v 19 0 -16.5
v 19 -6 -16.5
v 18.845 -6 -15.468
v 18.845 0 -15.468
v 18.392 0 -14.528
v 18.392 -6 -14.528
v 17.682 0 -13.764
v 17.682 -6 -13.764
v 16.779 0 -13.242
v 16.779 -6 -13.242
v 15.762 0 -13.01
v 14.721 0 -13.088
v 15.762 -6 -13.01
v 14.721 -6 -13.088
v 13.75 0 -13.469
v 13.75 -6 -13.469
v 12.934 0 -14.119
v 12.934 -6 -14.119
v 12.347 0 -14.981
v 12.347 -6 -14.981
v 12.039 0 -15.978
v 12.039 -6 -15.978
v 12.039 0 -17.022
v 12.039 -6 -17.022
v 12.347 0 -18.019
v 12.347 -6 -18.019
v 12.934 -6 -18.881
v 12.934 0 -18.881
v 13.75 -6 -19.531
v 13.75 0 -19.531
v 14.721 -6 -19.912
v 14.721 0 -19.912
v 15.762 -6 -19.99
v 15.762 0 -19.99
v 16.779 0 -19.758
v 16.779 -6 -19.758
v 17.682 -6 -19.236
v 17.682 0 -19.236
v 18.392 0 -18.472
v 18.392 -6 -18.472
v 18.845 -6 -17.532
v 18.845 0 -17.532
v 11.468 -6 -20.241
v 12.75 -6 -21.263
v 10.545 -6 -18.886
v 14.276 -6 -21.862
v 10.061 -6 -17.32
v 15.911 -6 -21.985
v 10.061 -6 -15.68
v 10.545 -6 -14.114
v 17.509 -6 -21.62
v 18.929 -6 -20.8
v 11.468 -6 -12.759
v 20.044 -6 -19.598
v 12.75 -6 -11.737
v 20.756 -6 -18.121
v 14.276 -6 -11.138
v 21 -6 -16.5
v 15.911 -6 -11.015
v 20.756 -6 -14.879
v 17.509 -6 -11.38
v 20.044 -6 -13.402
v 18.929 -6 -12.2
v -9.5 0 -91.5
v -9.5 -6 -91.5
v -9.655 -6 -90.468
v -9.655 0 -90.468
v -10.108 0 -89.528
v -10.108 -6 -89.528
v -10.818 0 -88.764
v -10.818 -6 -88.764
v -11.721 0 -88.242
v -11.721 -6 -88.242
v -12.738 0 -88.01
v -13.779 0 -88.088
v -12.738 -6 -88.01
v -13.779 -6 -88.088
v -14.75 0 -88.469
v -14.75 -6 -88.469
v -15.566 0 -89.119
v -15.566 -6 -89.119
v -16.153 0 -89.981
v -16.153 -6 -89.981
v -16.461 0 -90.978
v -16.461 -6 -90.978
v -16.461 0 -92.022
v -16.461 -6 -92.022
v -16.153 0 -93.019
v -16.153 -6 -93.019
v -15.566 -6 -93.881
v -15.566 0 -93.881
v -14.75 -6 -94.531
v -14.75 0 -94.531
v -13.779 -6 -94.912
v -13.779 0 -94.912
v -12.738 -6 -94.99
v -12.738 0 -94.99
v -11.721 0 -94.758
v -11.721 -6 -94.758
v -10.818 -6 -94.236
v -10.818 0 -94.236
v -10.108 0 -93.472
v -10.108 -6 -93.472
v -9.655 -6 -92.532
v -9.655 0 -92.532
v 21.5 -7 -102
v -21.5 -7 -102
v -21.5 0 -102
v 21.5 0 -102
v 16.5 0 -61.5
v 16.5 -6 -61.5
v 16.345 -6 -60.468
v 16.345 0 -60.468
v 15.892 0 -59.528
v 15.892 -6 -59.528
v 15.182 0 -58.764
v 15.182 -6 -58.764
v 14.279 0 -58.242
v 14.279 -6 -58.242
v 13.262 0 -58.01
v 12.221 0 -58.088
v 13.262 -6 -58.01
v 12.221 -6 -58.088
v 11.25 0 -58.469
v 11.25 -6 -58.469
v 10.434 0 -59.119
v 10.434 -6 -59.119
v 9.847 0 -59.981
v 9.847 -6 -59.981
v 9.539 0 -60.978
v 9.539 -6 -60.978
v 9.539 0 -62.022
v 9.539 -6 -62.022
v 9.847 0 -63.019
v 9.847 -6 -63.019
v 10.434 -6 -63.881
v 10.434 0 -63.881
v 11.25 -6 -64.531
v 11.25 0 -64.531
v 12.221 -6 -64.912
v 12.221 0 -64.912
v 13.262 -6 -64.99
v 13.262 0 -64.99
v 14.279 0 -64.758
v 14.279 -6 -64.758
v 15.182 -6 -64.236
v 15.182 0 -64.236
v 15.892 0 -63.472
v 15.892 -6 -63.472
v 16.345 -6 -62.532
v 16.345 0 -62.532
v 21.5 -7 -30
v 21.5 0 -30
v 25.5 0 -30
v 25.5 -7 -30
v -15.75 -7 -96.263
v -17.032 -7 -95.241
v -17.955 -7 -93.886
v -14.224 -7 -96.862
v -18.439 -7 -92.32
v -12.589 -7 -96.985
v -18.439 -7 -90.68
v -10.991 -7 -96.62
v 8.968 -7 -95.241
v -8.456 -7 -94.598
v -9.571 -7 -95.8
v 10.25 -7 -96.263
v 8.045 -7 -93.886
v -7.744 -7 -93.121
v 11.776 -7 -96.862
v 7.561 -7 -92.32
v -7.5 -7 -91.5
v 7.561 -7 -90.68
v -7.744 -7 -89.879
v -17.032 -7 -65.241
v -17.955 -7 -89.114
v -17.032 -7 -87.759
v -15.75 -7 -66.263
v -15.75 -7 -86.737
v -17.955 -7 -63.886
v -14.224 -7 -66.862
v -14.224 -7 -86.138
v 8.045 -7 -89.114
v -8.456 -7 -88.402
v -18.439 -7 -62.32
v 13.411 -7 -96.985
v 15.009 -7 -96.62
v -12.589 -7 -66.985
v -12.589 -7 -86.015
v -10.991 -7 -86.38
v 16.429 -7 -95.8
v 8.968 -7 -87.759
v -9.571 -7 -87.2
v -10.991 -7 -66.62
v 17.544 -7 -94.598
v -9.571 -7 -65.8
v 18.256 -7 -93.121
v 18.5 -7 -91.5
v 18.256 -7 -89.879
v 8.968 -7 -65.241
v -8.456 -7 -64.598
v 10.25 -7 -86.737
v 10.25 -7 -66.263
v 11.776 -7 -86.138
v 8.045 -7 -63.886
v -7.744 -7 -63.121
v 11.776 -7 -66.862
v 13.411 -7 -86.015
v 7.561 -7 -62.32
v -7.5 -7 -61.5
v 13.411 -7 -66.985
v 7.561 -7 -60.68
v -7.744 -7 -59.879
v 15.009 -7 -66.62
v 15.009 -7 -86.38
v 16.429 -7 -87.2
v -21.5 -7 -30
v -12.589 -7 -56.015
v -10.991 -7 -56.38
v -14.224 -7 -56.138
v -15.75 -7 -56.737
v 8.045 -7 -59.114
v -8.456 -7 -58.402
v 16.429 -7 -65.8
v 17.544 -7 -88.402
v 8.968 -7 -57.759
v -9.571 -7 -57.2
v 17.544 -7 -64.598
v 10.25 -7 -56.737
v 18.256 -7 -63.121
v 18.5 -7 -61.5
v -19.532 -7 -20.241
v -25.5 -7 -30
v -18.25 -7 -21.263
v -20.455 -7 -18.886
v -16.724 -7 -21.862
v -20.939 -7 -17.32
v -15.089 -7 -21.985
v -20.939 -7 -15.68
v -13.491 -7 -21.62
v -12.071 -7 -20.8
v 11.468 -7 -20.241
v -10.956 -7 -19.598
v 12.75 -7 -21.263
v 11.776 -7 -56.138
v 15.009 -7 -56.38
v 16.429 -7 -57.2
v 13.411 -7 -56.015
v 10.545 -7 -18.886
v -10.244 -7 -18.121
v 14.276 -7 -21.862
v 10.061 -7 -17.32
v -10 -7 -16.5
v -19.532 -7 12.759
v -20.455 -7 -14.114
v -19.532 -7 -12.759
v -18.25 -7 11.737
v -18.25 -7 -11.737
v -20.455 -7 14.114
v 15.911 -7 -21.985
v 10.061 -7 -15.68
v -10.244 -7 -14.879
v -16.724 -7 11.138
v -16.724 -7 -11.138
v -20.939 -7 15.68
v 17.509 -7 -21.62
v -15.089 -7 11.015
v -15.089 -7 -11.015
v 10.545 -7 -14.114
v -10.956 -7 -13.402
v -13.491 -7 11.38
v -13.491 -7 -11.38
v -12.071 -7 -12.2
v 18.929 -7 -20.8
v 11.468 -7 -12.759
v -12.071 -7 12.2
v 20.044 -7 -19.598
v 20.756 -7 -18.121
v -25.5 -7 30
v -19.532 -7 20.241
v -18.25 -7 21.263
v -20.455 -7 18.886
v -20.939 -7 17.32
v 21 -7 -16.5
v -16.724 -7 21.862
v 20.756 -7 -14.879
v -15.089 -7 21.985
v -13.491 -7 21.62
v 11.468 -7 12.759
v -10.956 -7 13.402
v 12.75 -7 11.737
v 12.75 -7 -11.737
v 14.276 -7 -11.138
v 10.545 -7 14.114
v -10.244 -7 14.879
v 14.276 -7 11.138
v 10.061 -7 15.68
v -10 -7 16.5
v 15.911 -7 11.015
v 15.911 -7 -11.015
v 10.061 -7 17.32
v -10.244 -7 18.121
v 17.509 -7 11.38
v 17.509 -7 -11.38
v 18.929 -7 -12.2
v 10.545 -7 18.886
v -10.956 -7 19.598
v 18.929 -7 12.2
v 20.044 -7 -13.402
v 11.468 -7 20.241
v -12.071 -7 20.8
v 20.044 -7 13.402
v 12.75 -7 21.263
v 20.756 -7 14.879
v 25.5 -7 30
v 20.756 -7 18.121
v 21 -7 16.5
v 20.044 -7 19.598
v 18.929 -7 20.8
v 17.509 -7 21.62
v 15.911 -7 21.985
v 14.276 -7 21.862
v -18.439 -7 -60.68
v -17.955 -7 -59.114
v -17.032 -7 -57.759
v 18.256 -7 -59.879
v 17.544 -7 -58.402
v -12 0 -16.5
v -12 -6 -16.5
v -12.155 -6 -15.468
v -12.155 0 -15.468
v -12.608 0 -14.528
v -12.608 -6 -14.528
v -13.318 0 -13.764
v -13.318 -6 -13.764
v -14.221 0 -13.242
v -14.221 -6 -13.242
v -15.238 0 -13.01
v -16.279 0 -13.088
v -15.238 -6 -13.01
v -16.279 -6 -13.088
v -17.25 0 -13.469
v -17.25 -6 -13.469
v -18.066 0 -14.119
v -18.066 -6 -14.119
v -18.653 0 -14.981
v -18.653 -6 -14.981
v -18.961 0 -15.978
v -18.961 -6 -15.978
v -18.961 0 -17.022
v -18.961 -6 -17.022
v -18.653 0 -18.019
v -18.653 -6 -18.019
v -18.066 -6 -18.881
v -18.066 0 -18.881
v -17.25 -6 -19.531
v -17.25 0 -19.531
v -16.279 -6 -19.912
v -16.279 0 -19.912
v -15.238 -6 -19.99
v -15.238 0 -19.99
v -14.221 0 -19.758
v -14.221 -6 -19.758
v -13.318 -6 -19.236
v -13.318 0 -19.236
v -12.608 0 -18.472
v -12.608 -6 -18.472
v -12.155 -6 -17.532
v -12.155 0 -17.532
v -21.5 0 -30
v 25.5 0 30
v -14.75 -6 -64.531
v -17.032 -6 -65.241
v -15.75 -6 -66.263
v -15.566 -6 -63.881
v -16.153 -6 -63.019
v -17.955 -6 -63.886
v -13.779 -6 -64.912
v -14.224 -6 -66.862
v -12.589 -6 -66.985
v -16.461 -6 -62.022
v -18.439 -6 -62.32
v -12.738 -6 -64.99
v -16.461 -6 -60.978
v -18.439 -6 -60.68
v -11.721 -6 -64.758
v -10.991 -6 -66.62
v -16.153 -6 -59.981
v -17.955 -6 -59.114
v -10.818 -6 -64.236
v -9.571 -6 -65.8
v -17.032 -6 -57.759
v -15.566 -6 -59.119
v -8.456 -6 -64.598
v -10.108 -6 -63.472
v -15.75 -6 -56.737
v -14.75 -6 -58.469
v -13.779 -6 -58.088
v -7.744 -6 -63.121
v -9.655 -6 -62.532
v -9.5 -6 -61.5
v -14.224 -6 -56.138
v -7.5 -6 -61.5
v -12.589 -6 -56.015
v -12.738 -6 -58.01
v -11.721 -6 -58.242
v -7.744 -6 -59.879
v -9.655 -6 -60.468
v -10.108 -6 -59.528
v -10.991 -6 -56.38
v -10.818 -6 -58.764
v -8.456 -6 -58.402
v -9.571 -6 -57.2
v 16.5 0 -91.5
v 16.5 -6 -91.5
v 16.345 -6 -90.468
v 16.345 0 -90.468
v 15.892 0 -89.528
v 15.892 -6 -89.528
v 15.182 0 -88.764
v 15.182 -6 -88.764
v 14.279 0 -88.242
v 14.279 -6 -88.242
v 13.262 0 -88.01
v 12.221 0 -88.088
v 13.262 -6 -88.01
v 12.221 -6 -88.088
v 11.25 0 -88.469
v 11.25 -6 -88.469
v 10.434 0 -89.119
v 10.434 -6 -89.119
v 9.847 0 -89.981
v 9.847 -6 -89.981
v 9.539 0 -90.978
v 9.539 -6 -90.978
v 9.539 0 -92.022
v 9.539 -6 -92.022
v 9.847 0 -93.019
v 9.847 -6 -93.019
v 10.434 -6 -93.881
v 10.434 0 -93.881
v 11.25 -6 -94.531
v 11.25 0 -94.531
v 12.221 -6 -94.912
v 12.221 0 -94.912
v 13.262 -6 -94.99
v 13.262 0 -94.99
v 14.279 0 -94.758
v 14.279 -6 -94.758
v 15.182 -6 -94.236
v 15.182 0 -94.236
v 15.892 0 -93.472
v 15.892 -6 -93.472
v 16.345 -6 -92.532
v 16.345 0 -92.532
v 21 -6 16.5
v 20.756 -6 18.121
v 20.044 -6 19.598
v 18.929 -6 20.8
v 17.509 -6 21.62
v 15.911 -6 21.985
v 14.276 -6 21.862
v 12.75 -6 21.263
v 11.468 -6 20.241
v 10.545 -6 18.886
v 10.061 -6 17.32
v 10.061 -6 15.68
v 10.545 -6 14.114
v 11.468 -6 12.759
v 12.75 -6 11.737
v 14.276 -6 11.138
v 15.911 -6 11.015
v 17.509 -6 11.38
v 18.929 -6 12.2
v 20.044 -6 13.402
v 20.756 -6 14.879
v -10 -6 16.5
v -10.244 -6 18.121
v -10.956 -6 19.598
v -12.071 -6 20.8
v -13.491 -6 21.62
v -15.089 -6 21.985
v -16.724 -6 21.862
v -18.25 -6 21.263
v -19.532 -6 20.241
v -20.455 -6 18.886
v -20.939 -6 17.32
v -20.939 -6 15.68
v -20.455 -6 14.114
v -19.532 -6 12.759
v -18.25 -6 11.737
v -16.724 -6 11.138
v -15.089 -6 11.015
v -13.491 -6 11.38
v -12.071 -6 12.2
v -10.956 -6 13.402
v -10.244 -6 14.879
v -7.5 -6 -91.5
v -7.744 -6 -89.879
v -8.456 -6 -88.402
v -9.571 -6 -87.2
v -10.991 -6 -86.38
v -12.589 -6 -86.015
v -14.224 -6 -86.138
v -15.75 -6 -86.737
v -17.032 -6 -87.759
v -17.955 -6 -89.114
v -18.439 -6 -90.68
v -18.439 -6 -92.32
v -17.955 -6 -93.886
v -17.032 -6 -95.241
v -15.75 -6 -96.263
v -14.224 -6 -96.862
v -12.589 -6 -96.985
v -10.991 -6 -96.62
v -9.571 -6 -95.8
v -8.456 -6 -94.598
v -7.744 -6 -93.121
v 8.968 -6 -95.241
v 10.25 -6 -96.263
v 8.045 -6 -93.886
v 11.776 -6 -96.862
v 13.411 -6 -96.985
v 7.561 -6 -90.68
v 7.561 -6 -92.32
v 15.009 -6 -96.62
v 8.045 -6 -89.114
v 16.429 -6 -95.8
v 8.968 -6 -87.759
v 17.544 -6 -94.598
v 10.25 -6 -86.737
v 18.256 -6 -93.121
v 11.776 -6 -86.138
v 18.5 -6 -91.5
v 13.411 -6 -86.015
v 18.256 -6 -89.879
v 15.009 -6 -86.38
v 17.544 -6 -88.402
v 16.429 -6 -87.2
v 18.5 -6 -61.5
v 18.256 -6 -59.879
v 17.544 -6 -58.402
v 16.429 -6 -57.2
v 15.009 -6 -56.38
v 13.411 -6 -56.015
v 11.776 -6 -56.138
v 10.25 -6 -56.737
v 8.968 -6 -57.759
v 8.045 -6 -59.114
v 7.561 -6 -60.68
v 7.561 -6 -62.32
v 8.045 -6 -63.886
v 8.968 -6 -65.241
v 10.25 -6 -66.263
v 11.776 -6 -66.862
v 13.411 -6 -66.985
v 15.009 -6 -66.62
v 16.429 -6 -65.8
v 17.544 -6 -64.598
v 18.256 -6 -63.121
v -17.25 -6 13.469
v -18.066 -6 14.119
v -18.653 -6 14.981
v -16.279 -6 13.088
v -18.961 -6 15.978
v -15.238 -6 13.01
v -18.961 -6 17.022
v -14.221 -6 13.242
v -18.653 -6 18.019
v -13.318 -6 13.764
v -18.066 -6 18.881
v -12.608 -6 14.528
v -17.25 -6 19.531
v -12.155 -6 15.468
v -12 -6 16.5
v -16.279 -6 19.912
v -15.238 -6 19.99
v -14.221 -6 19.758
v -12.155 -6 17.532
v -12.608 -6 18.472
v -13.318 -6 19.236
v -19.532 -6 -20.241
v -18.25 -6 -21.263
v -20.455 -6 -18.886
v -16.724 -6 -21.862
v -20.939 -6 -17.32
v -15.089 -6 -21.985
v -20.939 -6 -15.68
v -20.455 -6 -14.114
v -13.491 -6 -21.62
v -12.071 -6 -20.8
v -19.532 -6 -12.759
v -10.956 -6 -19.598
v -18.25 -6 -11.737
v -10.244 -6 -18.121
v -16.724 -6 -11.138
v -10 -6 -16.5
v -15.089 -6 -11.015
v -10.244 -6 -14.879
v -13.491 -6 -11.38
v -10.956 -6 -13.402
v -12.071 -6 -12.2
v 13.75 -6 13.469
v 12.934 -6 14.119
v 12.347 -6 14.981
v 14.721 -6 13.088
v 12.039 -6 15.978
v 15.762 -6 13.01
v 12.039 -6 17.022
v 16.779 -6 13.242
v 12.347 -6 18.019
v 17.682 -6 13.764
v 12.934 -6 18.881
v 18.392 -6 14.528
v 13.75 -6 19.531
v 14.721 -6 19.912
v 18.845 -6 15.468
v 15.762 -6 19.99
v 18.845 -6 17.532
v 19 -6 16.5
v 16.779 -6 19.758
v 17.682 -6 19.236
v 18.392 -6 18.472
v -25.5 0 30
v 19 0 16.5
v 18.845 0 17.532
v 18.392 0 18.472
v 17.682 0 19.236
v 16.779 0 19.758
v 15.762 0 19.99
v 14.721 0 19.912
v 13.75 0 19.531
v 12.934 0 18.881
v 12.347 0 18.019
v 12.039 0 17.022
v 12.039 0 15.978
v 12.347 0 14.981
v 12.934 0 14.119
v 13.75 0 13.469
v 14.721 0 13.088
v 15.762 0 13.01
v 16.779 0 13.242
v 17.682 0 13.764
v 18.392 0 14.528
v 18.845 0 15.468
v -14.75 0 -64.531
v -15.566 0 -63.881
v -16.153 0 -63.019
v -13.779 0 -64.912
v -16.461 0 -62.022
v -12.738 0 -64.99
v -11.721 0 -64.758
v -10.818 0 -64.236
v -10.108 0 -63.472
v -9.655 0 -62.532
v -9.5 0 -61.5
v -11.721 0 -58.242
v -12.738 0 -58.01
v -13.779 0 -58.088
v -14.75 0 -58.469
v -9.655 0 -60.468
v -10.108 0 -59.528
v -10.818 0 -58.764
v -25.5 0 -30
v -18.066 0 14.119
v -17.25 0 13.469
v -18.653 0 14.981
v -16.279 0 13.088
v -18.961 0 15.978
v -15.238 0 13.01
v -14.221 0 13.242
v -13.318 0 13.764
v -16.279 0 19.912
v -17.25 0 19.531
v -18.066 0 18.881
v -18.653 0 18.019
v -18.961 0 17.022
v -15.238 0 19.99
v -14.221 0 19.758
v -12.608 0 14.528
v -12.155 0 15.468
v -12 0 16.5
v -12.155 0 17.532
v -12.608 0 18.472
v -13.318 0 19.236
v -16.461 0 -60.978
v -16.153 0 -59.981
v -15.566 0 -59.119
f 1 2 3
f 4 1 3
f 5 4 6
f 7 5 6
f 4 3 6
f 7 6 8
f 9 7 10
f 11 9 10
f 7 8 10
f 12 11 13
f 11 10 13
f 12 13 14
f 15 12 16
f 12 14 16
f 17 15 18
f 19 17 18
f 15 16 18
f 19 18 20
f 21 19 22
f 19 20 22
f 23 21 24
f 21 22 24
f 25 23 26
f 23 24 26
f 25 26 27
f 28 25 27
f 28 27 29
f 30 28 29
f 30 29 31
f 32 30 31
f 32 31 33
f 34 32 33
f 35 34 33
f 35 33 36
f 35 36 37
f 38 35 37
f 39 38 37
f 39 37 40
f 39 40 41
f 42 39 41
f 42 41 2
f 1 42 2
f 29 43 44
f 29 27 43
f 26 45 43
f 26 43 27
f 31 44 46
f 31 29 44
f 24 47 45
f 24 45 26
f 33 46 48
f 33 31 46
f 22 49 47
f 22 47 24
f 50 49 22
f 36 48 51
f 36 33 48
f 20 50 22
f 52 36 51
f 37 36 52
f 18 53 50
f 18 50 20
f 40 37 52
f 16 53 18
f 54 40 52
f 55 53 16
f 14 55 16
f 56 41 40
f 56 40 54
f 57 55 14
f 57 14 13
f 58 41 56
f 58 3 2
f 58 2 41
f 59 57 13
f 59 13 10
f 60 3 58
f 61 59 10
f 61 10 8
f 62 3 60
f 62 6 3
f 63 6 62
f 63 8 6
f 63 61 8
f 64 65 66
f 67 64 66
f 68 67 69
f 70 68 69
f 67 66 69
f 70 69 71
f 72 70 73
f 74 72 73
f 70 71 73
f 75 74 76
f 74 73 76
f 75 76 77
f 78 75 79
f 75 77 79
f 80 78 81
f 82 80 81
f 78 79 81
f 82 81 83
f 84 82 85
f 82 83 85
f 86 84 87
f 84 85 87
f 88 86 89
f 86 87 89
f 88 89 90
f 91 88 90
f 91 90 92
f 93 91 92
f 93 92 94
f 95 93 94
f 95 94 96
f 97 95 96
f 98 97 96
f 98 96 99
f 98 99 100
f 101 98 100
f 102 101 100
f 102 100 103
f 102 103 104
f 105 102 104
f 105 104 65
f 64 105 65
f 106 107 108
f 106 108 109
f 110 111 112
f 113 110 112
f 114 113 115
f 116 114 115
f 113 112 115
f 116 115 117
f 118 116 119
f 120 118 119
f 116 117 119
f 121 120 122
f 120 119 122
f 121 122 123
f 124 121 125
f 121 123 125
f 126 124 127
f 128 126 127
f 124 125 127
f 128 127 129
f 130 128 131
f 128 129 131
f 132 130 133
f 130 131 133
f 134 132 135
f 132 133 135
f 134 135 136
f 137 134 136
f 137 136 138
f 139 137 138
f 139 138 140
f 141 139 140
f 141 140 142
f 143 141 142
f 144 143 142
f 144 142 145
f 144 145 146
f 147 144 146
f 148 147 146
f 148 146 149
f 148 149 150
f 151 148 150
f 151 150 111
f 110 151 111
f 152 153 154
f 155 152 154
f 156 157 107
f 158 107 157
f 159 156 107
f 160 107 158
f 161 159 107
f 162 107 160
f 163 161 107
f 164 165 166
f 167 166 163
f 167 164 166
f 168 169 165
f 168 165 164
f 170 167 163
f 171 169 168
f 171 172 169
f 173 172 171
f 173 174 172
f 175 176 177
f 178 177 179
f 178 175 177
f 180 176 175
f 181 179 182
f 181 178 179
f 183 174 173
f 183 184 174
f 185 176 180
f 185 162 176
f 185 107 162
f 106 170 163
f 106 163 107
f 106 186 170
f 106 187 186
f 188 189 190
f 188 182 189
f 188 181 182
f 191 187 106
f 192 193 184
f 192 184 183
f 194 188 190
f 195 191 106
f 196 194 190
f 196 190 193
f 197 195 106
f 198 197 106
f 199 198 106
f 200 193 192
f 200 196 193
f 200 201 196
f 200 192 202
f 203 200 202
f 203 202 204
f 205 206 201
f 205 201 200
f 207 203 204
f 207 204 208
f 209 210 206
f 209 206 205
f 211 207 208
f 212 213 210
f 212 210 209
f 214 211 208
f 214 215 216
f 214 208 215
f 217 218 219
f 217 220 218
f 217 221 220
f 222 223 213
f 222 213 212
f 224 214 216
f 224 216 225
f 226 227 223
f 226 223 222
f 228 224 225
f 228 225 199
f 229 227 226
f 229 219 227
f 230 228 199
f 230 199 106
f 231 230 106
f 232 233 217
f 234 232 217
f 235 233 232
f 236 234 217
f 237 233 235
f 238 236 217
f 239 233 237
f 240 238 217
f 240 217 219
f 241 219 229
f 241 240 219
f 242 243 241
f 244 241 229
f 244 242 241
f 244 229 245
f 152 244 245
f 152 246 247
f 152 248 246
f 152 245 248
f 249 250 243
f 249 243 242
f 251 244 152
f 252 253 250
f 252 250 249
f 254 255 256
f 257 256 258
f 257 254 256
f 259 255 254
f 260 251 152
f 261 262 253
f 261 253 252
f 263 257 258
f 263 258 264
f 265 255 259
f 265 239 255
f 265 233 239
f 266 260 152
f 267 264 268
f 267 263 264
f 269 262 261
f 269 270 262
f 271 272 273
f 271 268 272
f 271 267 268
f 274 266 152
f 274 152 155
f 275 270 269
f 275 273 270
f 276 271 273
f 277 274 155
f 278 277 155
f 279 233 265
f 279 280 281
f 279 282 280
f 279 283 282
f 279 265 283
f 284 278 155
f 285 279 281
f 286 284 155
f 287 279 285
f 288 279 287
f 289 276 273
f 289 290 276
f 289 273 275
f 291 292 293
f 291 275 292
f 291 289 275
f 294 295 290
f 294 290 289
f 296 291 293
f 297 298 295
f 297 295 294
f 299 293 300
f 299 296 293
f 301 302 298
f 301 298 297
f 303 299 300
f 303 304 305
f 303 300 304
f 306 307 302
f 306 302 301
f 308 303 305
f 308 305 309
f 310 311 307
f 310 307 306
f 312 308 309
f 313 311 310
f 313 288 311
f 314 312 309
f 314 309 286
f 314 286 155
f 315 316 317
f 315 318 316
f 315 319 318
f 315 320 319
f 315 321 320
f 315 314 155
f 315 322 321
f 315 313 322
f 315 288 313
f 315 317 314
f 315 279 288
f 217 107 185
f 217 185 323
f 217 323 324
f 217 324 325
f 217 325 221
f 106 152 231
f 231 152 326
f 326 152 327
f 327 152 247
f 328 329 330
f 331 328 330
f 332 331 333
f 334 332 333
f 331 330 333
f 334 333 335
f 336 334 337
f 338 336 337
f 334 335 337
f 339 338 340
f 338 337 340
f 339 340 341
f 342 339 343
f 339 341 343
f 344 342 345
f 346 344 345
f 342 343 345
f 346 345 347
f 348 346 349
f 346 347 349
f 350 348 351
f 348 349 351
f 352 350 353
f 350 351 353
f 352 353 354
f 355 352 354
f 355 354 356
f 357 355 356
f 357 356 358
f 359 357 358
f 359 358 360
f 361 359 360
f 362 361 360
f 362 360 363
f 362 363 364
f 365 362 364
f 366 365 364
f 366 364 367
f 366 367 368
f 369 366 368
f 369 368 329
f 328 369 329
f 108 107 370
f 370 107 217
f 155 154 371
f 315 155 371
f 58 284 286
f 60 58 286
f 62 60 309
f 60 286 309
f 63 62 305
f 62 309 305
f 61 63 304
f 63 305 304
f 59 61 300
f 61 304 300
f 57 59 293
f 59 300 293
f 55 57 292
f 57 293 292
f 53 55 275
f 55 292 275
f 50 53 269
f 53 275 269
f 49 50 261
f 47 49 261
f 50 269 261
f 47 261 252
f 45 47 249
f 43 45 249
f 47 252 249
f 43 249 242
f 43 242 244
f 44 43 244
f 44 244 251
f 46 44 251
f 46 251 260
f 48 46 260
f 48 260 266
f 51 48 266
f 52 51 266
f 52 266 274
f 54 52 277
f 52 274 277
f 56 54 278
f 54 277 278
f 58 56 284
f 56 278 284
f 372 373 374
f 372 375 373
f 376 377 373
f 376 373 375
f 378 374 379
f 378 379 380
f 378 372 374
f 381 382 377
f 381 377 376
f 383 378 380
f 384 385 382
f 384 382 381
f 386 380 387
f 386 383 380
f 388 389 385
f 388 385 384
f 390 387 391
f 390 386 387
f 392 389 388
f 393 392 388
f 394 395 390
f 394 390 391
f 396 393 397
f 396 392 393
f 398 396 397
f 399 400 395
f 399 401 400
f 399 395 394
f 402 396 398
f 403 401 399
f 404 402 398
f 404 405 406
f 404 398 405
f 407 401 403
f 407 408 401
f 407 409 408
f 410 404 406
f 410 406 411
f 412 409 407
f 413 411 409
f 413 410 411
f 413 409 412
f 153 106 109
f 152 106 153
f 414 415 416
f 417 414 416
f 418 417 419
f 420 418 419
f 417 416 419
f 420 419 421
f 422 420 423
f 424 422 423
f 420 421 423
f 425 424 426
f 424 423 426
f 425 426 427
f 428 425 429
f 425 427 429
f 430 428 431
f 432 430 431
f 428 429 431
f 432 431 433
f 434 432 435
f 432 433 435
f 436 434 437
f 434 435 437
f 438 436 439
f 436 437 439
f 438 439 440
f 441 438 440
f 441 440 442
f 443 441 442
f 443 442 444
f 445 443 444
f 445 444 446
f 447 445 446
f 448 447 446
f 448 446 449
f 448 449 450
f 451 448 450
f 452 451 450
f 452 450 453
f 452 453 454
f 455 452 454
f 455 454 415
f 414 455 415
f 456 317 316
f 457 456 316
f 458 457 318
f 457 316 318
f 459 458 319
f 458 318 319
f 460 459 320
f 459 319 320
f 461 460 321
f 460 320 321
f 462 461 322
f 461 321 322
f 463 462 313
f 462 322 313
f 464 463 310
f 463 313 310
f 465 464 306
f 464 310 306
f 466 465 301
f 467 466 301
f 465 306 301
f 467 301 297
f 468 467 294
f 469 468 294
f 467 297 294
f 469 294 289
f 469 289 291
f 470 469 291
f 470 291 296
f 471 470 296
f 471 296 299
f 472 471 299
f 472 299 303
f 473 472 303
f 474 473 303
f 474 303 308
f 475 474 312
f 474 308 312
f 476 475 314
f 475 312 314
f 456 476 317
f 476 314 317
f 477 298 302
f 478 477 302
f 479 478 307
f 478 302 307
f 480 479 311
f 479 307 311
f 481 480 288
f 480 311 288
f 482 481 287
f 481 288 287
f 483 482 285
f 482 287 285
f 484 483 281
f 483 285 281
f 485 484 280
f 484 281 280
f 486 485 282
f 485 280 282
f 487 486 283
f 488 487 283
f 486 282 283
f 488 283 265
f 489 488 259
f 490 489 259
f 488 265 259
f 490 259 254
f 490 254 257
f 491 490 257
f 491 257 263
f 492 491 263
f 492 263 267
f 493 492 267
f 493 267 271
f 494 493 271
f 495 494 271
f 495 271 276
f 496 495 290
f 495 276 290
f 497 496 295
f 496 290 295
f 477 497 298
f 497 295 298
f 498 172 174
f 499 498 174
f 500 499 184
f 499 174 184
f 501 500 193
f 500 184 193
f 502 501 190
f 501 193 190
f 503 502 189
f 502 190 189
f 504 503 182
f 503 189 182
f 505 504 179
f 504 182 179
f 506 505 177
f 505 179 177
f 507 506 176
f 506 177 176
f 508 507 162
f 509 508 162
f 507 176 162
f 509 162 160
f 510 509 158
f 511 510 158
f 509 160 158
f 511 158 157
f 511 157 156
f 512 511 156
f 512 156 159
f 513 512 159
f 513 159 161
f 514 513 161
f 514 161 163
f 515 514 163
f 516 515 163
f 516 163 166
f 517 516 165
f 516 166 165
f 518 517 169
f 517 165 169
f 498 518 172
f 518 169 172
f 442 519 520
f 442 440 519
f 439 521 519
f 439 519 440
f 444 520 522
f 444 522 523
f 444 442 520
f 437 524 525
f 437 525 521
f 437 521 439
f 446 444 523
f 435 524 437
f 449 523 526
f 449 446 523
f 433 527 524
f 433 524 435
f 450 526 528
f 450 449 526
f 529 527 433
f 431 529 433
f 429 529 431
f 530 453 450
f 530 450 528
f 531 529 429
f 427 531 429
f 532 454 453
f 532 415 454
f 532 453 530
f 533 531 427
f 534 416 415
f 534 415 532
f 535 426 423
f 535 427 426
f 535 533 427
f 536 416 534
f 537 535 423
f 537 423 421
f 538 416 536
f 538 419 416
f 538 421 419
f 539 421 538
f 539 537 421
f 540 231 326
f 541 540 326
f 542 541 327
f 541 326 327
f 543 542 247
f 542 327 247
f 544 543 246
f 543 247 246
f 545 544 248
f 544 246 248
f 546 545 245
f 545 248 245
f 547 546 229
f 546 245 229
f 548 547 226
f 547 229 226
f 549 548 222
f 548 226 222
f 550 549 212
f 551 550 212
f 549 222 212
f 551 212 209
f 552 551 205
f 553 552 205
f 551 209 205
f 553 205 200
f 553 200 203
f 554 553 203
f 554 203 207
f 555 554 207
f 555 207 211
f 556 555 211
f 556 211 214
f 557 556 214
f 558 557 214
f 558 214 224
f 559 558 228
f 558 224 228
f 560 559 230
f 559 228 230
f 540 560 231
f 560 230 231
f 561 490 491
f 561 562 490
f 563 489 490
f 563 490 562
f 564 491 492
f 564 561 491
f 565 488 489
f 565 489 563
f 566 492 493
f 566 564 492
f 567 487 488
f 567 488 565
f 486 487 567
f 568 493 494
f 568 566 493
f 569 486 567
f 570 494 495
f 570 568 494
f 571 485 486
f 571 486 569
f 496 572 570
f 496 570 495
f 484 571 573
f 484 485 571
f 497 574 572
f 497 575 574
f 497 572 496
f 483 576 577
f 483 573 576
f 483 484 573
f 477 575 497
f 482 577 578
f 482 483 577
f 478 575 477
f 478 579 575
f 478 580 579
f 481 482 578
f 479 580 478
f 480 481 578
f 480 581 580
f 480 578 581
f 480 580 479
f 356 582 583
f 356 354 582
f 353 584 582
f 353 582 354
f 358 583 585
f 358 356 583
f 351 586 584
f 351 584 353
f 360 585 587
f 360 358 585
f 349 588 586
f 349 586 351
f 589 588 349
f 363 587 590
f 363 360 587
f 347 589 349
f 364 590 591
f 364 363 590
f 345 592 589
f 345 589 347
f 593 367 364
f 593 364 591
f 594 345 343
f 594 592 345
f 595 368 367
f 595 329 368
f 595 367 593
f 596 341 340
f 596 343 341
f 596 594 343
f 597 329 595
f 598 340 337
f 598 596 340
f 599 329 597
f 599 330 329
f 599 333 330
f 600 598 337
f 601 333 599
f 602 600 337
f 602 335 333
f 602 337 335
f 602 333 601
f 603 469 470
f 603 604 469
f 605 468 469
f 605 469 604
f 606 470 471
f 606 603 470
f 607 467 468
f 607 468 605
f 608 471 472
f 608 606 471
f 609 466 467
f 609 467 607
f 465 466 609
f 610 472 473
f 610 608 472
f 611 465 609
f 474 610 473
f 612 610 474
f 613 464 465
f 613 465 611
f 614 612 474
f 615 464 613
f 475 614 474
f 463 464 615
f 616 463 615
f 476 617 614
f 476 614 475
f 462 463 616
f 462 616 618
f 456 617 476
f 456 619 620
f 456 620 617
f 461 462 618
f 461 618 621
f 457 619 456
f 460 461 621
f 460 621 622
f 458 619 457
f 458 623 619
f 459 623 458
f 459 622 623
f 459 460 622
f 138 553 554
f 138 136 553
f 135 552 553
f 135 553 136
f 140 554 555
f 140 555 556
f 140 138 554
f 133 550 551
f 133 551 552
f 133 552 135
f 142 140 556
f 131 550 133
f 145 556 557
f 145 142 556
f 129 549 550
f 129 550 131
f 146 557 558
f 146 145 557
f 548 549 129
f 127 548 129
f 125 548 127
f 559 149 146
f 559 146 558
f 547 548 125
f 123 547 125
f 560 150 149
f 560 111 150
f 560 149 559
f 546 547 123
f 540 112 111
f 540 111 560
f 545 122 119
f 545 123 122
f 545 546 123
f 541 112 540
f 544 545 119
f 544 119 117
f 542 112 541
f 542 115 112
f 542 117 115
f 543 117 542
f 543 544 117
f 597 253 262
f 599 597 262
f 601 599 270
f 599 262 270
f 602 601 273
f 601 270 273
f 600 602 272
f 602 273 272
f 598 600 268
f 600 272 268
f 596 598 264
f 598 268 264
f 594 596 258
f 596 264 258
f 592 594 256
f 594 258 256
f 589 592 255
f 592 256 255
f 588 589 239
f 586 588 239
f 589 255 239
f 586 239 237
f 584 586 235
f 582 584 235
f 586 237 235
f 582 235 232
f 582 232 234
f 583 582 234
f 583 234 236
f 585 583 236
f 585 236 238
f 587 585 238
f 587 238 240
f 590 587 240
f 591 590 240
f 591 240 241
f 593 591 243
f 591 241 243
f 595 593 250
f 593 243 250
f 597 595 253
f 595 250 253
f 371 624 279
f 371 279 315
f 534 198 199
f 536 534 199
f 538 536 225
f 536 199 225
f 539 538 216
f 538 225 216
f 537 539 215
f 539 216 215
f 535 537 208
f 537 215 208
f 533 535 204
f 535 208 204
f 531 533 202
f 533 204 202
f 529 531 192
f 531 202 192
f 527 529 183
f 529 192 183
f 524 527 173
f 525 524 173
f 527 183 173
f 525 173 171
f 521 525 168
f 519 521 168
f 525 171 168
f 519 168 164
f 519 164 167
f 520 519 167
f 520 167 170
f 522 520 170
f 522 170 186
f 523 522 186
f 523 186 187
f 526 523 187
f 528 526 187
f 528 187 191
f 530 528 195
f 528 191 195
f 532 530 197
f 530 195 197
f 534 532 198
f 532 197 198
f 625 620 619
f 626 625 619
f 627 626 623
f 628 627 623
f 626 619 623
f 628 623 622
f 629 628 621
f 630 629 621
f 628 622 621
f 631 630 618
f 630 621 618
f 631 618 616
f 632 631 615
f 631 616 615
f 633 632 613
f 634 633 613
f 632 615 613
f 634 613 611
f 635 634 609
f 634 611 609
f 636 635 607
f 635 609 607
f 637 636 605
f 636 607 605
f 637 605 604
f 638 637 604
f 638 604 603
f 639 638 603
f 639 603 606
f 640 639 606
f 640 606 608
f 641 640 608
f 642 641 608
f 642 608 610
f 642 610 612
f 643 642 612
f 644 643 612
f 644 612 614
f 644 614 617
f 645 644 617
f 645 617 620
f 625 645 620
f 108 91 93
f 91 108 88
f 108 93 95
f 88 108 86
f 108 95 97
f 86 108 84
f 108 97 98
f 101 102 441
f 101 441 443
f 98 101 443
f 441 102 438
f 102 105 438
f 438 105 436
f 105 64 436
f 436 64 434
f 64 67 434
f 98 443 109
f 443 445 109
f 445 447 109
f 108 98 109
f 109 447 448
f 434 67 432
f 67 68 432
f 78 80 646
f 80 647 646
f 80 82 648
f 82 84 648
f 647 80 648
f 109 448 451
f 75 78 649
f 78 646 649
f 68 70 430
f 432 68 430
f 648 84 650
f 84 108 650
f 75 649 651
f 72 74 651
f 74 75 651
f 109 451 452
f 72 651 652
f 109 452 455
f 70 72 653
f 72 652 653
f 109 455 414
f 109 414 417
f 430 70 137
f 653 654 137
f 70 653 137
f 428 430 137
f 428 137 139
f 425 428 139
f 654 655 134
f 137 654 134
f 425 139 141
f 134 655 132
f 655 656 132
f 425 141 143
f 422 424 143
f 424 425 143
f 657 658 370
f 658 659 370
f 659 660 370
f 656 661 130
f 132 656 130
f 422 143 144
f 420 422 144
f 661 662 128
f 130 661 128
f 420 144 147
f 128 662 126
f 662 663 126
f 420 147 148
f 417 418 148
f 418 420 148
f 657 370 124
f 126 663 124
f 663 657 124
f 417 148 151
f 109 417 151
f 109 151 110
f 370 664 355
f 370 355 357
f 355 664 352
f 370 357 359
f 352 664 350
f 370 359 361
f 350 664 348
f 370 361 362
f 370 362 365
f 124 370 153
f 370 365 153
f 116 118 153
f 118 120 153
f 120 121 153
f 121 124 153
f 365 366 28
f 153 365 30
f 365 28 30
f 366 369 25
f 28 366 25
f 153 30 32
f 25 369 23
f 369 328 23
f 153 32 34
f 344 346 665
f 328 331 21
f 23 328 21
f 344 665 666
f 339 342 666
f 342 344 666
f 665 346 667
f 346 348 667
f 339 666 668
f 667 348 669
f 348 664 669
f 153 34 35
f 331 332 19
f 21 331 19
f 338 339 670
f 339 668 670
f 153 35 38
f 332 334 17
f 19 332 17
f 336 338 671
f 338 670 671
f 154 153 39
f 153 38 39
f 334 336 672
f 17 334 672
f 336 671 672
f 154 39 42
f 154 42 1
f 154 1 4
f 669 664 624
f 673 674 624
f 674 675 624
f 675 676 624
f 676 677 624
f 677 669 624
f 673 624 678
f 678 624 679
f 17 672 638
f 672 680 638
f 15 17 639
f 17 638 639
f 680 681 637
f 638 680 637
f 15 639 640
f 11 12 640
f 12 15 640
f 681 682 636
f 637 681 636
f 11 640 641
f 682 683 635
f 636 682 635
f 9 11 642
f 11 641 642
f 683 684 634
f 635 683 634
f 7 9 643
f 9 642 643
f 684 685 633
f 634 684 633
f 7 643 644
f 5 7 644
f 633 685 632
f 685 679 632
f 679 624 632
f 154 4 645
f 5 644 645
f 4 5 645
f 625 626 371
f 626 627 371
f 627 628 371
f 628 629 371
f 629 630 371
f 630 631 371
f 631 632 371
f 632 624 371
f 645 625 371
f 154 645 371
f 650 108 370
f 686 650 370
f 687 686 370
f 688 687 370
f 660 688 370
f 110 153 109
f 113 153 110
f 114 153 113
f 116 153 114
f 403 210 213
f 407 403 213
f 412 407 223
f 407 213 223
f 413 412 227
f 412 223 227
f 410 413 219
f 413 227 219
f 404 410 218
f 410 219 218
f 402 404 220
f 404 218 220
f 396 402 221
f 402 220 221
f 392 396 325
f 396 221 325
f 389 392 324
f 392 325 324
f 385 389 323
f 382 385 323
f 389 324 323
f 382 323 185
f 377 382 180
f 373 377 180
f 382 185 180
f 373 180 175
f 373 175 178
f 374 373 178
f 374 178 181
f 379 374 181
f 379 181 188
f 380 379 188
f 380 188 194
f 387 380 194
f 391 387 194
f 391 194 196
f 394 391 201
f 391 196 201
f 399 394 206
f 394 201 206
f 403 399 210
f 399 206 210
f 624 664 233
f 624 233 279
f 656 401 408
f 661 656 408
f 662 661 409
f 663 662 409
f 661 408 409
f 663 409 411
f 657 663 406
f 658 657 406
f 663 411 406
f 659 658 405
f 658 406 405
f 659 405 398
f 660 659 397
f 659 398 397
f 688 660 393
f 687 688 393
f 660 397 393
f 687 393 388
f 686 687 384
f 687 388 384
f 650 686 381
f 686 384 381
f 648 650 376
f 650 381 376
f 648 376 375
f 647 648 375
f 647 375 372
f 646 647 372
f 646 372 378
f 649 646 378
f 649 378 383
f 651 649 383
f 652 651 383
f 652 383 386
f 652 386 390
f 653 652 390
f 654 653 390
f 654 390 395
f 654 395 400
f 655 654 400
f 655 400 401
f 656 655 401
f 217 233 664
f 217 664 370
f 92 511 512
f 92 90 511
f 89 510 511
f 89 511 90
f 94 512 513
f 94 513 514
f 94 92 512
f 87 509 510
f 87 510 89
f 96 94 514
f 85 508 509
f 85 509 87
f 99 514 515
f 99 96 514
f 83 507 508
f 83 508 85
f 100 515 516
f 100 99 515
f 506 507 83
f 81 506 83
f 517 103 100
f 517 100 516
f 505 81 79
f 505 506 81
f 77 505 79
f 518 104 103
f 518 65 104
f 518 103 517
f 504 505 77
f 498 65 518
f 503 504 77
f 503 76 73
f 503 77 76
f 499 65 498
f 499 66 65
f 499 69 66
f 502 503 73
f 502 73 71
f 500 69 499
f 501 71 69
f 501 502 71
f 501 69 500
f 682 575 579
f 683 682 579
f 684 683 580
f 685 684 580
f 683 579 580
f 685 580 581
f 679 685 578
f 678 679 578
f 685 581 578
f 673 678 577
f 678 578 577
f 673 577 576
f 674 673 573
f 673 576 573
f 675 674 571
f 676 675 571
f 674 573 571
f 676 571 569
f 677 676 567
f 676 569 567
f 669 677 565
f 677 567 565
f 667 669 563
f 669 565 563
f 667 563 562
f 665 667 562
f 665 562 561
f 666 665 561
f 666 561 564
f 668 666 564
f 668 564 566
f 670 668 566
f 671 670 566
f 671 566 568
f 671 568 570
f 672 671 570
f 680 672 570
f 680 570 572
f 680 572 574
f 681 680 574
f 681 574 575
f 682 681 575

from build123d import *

# Parameters (mm, degrees)
F0_W      = 51
F0_H      = 60
F1_DEPTH  = 7
F2_R      = 3.5
F3_DEPTH  = 25
F4_R      = 5.5
F5_DEPTH  = 1
F6_W      = 43
F6_H      = 80
F7_DEPTH  = 7
F9_R      = 3.5
F10_DEPTH = 25
F11_R     = 5.5
F12_DEPTH = 1
F13_W     = 43
F13_H     = 8
F14_DEPTH = 25


with BuildPart() as f1:
    # F0 (on Front) → F1 (new body)
    with BuildSketch(Plane.XZ):
        Rectangle(F0_W, F0_H)
    extrude(amount=F1_DEPTH)

    # F2 (on face) → F3 (cut)
    with BuildSketch(Plane.XZ.offset(7)):
        with Locations((-15.5, 16.5)):
            Circle(F2_R)
        with Locations((-15.5, -16.5)):
            Circle(F2_R)
        with Locations((15.5, 16.5)):
            Circle(F2_R)
        with Locations((15.5, -16.5)):
            Circle(F2_R)
    extrude(amount=-F3_DEPTH, mode=Mode.SUBTRACT)

    # F4 (on face) → F5 (cut)
    with BuildSketch(Plane.XZ.offset(7)):
        with Locations((-15.5, 16.5)):
            Circle(F4_R)
        with Locations((-15.5, -16.5)):
            Circle(F4_R)
        with Locations((15.5, -16.5)):
            Circle(F4_R)
        with Locations((15.5, 16.5)):
            Circle(F4_R)
    extrude(amount=-F5_DEPTH, mode=Mode.SUBTRACT)


with BuildPart() as f7:
    # F6 (on face) → F7 (new body)
    with BuildSketch(Plane.XZ.offset(7)):
        with Locations((0, -70)):
            Rectangle(F6_W, F6_H)
    extrude(amount=-F7_DEPTH)


with BuildPart() as f1_1:
    add(f1.part)

    # F8: union F7
    add(f7.part)

    # F9 (on face) → F10 (cut)
    with BuildSketch(Plane.XZ.offset(7)):
        with Locations((-13, -61.5)):
            Circle(F9_R)
        with Locations((13, -61.5)):
            Circle(F9_R)
        with Locations((-13, -91.5)):
            Circle(F9_R)
        with Locations((13, -91.5)):
            Circle(F9_R)
    extrude(amount=-F10_DEPTH, mode=Mode.SUBTRACT)

    # F11 (on face) → F12 (cut)
    with BuildSketch(Plane.XZ.offset(7)):
        with Locations((-13, -61.5)):
            Circle(F11_R)
        with Locations((13, -61.5)):
            Circle(F11_R)
        with Locations((-13, -91.5)):
            Circle(F11_R)
        with Locations((13, -91.5)):
            Circle(F11_R)
    extrude(amount=-F12_DEPTH, mode=Mode.SUBTRACT)

    # F13 (on face) → F14 (cut)
    with BuildSketch(Plane.XZ.offset(7)):
        with Locations((0, -106)):
            Rectangle(F13_W, F13_H)
    extrude(amount=-F14_DEPTH, mode=Mode.SUBTRACT)


solid = f1_1.part
